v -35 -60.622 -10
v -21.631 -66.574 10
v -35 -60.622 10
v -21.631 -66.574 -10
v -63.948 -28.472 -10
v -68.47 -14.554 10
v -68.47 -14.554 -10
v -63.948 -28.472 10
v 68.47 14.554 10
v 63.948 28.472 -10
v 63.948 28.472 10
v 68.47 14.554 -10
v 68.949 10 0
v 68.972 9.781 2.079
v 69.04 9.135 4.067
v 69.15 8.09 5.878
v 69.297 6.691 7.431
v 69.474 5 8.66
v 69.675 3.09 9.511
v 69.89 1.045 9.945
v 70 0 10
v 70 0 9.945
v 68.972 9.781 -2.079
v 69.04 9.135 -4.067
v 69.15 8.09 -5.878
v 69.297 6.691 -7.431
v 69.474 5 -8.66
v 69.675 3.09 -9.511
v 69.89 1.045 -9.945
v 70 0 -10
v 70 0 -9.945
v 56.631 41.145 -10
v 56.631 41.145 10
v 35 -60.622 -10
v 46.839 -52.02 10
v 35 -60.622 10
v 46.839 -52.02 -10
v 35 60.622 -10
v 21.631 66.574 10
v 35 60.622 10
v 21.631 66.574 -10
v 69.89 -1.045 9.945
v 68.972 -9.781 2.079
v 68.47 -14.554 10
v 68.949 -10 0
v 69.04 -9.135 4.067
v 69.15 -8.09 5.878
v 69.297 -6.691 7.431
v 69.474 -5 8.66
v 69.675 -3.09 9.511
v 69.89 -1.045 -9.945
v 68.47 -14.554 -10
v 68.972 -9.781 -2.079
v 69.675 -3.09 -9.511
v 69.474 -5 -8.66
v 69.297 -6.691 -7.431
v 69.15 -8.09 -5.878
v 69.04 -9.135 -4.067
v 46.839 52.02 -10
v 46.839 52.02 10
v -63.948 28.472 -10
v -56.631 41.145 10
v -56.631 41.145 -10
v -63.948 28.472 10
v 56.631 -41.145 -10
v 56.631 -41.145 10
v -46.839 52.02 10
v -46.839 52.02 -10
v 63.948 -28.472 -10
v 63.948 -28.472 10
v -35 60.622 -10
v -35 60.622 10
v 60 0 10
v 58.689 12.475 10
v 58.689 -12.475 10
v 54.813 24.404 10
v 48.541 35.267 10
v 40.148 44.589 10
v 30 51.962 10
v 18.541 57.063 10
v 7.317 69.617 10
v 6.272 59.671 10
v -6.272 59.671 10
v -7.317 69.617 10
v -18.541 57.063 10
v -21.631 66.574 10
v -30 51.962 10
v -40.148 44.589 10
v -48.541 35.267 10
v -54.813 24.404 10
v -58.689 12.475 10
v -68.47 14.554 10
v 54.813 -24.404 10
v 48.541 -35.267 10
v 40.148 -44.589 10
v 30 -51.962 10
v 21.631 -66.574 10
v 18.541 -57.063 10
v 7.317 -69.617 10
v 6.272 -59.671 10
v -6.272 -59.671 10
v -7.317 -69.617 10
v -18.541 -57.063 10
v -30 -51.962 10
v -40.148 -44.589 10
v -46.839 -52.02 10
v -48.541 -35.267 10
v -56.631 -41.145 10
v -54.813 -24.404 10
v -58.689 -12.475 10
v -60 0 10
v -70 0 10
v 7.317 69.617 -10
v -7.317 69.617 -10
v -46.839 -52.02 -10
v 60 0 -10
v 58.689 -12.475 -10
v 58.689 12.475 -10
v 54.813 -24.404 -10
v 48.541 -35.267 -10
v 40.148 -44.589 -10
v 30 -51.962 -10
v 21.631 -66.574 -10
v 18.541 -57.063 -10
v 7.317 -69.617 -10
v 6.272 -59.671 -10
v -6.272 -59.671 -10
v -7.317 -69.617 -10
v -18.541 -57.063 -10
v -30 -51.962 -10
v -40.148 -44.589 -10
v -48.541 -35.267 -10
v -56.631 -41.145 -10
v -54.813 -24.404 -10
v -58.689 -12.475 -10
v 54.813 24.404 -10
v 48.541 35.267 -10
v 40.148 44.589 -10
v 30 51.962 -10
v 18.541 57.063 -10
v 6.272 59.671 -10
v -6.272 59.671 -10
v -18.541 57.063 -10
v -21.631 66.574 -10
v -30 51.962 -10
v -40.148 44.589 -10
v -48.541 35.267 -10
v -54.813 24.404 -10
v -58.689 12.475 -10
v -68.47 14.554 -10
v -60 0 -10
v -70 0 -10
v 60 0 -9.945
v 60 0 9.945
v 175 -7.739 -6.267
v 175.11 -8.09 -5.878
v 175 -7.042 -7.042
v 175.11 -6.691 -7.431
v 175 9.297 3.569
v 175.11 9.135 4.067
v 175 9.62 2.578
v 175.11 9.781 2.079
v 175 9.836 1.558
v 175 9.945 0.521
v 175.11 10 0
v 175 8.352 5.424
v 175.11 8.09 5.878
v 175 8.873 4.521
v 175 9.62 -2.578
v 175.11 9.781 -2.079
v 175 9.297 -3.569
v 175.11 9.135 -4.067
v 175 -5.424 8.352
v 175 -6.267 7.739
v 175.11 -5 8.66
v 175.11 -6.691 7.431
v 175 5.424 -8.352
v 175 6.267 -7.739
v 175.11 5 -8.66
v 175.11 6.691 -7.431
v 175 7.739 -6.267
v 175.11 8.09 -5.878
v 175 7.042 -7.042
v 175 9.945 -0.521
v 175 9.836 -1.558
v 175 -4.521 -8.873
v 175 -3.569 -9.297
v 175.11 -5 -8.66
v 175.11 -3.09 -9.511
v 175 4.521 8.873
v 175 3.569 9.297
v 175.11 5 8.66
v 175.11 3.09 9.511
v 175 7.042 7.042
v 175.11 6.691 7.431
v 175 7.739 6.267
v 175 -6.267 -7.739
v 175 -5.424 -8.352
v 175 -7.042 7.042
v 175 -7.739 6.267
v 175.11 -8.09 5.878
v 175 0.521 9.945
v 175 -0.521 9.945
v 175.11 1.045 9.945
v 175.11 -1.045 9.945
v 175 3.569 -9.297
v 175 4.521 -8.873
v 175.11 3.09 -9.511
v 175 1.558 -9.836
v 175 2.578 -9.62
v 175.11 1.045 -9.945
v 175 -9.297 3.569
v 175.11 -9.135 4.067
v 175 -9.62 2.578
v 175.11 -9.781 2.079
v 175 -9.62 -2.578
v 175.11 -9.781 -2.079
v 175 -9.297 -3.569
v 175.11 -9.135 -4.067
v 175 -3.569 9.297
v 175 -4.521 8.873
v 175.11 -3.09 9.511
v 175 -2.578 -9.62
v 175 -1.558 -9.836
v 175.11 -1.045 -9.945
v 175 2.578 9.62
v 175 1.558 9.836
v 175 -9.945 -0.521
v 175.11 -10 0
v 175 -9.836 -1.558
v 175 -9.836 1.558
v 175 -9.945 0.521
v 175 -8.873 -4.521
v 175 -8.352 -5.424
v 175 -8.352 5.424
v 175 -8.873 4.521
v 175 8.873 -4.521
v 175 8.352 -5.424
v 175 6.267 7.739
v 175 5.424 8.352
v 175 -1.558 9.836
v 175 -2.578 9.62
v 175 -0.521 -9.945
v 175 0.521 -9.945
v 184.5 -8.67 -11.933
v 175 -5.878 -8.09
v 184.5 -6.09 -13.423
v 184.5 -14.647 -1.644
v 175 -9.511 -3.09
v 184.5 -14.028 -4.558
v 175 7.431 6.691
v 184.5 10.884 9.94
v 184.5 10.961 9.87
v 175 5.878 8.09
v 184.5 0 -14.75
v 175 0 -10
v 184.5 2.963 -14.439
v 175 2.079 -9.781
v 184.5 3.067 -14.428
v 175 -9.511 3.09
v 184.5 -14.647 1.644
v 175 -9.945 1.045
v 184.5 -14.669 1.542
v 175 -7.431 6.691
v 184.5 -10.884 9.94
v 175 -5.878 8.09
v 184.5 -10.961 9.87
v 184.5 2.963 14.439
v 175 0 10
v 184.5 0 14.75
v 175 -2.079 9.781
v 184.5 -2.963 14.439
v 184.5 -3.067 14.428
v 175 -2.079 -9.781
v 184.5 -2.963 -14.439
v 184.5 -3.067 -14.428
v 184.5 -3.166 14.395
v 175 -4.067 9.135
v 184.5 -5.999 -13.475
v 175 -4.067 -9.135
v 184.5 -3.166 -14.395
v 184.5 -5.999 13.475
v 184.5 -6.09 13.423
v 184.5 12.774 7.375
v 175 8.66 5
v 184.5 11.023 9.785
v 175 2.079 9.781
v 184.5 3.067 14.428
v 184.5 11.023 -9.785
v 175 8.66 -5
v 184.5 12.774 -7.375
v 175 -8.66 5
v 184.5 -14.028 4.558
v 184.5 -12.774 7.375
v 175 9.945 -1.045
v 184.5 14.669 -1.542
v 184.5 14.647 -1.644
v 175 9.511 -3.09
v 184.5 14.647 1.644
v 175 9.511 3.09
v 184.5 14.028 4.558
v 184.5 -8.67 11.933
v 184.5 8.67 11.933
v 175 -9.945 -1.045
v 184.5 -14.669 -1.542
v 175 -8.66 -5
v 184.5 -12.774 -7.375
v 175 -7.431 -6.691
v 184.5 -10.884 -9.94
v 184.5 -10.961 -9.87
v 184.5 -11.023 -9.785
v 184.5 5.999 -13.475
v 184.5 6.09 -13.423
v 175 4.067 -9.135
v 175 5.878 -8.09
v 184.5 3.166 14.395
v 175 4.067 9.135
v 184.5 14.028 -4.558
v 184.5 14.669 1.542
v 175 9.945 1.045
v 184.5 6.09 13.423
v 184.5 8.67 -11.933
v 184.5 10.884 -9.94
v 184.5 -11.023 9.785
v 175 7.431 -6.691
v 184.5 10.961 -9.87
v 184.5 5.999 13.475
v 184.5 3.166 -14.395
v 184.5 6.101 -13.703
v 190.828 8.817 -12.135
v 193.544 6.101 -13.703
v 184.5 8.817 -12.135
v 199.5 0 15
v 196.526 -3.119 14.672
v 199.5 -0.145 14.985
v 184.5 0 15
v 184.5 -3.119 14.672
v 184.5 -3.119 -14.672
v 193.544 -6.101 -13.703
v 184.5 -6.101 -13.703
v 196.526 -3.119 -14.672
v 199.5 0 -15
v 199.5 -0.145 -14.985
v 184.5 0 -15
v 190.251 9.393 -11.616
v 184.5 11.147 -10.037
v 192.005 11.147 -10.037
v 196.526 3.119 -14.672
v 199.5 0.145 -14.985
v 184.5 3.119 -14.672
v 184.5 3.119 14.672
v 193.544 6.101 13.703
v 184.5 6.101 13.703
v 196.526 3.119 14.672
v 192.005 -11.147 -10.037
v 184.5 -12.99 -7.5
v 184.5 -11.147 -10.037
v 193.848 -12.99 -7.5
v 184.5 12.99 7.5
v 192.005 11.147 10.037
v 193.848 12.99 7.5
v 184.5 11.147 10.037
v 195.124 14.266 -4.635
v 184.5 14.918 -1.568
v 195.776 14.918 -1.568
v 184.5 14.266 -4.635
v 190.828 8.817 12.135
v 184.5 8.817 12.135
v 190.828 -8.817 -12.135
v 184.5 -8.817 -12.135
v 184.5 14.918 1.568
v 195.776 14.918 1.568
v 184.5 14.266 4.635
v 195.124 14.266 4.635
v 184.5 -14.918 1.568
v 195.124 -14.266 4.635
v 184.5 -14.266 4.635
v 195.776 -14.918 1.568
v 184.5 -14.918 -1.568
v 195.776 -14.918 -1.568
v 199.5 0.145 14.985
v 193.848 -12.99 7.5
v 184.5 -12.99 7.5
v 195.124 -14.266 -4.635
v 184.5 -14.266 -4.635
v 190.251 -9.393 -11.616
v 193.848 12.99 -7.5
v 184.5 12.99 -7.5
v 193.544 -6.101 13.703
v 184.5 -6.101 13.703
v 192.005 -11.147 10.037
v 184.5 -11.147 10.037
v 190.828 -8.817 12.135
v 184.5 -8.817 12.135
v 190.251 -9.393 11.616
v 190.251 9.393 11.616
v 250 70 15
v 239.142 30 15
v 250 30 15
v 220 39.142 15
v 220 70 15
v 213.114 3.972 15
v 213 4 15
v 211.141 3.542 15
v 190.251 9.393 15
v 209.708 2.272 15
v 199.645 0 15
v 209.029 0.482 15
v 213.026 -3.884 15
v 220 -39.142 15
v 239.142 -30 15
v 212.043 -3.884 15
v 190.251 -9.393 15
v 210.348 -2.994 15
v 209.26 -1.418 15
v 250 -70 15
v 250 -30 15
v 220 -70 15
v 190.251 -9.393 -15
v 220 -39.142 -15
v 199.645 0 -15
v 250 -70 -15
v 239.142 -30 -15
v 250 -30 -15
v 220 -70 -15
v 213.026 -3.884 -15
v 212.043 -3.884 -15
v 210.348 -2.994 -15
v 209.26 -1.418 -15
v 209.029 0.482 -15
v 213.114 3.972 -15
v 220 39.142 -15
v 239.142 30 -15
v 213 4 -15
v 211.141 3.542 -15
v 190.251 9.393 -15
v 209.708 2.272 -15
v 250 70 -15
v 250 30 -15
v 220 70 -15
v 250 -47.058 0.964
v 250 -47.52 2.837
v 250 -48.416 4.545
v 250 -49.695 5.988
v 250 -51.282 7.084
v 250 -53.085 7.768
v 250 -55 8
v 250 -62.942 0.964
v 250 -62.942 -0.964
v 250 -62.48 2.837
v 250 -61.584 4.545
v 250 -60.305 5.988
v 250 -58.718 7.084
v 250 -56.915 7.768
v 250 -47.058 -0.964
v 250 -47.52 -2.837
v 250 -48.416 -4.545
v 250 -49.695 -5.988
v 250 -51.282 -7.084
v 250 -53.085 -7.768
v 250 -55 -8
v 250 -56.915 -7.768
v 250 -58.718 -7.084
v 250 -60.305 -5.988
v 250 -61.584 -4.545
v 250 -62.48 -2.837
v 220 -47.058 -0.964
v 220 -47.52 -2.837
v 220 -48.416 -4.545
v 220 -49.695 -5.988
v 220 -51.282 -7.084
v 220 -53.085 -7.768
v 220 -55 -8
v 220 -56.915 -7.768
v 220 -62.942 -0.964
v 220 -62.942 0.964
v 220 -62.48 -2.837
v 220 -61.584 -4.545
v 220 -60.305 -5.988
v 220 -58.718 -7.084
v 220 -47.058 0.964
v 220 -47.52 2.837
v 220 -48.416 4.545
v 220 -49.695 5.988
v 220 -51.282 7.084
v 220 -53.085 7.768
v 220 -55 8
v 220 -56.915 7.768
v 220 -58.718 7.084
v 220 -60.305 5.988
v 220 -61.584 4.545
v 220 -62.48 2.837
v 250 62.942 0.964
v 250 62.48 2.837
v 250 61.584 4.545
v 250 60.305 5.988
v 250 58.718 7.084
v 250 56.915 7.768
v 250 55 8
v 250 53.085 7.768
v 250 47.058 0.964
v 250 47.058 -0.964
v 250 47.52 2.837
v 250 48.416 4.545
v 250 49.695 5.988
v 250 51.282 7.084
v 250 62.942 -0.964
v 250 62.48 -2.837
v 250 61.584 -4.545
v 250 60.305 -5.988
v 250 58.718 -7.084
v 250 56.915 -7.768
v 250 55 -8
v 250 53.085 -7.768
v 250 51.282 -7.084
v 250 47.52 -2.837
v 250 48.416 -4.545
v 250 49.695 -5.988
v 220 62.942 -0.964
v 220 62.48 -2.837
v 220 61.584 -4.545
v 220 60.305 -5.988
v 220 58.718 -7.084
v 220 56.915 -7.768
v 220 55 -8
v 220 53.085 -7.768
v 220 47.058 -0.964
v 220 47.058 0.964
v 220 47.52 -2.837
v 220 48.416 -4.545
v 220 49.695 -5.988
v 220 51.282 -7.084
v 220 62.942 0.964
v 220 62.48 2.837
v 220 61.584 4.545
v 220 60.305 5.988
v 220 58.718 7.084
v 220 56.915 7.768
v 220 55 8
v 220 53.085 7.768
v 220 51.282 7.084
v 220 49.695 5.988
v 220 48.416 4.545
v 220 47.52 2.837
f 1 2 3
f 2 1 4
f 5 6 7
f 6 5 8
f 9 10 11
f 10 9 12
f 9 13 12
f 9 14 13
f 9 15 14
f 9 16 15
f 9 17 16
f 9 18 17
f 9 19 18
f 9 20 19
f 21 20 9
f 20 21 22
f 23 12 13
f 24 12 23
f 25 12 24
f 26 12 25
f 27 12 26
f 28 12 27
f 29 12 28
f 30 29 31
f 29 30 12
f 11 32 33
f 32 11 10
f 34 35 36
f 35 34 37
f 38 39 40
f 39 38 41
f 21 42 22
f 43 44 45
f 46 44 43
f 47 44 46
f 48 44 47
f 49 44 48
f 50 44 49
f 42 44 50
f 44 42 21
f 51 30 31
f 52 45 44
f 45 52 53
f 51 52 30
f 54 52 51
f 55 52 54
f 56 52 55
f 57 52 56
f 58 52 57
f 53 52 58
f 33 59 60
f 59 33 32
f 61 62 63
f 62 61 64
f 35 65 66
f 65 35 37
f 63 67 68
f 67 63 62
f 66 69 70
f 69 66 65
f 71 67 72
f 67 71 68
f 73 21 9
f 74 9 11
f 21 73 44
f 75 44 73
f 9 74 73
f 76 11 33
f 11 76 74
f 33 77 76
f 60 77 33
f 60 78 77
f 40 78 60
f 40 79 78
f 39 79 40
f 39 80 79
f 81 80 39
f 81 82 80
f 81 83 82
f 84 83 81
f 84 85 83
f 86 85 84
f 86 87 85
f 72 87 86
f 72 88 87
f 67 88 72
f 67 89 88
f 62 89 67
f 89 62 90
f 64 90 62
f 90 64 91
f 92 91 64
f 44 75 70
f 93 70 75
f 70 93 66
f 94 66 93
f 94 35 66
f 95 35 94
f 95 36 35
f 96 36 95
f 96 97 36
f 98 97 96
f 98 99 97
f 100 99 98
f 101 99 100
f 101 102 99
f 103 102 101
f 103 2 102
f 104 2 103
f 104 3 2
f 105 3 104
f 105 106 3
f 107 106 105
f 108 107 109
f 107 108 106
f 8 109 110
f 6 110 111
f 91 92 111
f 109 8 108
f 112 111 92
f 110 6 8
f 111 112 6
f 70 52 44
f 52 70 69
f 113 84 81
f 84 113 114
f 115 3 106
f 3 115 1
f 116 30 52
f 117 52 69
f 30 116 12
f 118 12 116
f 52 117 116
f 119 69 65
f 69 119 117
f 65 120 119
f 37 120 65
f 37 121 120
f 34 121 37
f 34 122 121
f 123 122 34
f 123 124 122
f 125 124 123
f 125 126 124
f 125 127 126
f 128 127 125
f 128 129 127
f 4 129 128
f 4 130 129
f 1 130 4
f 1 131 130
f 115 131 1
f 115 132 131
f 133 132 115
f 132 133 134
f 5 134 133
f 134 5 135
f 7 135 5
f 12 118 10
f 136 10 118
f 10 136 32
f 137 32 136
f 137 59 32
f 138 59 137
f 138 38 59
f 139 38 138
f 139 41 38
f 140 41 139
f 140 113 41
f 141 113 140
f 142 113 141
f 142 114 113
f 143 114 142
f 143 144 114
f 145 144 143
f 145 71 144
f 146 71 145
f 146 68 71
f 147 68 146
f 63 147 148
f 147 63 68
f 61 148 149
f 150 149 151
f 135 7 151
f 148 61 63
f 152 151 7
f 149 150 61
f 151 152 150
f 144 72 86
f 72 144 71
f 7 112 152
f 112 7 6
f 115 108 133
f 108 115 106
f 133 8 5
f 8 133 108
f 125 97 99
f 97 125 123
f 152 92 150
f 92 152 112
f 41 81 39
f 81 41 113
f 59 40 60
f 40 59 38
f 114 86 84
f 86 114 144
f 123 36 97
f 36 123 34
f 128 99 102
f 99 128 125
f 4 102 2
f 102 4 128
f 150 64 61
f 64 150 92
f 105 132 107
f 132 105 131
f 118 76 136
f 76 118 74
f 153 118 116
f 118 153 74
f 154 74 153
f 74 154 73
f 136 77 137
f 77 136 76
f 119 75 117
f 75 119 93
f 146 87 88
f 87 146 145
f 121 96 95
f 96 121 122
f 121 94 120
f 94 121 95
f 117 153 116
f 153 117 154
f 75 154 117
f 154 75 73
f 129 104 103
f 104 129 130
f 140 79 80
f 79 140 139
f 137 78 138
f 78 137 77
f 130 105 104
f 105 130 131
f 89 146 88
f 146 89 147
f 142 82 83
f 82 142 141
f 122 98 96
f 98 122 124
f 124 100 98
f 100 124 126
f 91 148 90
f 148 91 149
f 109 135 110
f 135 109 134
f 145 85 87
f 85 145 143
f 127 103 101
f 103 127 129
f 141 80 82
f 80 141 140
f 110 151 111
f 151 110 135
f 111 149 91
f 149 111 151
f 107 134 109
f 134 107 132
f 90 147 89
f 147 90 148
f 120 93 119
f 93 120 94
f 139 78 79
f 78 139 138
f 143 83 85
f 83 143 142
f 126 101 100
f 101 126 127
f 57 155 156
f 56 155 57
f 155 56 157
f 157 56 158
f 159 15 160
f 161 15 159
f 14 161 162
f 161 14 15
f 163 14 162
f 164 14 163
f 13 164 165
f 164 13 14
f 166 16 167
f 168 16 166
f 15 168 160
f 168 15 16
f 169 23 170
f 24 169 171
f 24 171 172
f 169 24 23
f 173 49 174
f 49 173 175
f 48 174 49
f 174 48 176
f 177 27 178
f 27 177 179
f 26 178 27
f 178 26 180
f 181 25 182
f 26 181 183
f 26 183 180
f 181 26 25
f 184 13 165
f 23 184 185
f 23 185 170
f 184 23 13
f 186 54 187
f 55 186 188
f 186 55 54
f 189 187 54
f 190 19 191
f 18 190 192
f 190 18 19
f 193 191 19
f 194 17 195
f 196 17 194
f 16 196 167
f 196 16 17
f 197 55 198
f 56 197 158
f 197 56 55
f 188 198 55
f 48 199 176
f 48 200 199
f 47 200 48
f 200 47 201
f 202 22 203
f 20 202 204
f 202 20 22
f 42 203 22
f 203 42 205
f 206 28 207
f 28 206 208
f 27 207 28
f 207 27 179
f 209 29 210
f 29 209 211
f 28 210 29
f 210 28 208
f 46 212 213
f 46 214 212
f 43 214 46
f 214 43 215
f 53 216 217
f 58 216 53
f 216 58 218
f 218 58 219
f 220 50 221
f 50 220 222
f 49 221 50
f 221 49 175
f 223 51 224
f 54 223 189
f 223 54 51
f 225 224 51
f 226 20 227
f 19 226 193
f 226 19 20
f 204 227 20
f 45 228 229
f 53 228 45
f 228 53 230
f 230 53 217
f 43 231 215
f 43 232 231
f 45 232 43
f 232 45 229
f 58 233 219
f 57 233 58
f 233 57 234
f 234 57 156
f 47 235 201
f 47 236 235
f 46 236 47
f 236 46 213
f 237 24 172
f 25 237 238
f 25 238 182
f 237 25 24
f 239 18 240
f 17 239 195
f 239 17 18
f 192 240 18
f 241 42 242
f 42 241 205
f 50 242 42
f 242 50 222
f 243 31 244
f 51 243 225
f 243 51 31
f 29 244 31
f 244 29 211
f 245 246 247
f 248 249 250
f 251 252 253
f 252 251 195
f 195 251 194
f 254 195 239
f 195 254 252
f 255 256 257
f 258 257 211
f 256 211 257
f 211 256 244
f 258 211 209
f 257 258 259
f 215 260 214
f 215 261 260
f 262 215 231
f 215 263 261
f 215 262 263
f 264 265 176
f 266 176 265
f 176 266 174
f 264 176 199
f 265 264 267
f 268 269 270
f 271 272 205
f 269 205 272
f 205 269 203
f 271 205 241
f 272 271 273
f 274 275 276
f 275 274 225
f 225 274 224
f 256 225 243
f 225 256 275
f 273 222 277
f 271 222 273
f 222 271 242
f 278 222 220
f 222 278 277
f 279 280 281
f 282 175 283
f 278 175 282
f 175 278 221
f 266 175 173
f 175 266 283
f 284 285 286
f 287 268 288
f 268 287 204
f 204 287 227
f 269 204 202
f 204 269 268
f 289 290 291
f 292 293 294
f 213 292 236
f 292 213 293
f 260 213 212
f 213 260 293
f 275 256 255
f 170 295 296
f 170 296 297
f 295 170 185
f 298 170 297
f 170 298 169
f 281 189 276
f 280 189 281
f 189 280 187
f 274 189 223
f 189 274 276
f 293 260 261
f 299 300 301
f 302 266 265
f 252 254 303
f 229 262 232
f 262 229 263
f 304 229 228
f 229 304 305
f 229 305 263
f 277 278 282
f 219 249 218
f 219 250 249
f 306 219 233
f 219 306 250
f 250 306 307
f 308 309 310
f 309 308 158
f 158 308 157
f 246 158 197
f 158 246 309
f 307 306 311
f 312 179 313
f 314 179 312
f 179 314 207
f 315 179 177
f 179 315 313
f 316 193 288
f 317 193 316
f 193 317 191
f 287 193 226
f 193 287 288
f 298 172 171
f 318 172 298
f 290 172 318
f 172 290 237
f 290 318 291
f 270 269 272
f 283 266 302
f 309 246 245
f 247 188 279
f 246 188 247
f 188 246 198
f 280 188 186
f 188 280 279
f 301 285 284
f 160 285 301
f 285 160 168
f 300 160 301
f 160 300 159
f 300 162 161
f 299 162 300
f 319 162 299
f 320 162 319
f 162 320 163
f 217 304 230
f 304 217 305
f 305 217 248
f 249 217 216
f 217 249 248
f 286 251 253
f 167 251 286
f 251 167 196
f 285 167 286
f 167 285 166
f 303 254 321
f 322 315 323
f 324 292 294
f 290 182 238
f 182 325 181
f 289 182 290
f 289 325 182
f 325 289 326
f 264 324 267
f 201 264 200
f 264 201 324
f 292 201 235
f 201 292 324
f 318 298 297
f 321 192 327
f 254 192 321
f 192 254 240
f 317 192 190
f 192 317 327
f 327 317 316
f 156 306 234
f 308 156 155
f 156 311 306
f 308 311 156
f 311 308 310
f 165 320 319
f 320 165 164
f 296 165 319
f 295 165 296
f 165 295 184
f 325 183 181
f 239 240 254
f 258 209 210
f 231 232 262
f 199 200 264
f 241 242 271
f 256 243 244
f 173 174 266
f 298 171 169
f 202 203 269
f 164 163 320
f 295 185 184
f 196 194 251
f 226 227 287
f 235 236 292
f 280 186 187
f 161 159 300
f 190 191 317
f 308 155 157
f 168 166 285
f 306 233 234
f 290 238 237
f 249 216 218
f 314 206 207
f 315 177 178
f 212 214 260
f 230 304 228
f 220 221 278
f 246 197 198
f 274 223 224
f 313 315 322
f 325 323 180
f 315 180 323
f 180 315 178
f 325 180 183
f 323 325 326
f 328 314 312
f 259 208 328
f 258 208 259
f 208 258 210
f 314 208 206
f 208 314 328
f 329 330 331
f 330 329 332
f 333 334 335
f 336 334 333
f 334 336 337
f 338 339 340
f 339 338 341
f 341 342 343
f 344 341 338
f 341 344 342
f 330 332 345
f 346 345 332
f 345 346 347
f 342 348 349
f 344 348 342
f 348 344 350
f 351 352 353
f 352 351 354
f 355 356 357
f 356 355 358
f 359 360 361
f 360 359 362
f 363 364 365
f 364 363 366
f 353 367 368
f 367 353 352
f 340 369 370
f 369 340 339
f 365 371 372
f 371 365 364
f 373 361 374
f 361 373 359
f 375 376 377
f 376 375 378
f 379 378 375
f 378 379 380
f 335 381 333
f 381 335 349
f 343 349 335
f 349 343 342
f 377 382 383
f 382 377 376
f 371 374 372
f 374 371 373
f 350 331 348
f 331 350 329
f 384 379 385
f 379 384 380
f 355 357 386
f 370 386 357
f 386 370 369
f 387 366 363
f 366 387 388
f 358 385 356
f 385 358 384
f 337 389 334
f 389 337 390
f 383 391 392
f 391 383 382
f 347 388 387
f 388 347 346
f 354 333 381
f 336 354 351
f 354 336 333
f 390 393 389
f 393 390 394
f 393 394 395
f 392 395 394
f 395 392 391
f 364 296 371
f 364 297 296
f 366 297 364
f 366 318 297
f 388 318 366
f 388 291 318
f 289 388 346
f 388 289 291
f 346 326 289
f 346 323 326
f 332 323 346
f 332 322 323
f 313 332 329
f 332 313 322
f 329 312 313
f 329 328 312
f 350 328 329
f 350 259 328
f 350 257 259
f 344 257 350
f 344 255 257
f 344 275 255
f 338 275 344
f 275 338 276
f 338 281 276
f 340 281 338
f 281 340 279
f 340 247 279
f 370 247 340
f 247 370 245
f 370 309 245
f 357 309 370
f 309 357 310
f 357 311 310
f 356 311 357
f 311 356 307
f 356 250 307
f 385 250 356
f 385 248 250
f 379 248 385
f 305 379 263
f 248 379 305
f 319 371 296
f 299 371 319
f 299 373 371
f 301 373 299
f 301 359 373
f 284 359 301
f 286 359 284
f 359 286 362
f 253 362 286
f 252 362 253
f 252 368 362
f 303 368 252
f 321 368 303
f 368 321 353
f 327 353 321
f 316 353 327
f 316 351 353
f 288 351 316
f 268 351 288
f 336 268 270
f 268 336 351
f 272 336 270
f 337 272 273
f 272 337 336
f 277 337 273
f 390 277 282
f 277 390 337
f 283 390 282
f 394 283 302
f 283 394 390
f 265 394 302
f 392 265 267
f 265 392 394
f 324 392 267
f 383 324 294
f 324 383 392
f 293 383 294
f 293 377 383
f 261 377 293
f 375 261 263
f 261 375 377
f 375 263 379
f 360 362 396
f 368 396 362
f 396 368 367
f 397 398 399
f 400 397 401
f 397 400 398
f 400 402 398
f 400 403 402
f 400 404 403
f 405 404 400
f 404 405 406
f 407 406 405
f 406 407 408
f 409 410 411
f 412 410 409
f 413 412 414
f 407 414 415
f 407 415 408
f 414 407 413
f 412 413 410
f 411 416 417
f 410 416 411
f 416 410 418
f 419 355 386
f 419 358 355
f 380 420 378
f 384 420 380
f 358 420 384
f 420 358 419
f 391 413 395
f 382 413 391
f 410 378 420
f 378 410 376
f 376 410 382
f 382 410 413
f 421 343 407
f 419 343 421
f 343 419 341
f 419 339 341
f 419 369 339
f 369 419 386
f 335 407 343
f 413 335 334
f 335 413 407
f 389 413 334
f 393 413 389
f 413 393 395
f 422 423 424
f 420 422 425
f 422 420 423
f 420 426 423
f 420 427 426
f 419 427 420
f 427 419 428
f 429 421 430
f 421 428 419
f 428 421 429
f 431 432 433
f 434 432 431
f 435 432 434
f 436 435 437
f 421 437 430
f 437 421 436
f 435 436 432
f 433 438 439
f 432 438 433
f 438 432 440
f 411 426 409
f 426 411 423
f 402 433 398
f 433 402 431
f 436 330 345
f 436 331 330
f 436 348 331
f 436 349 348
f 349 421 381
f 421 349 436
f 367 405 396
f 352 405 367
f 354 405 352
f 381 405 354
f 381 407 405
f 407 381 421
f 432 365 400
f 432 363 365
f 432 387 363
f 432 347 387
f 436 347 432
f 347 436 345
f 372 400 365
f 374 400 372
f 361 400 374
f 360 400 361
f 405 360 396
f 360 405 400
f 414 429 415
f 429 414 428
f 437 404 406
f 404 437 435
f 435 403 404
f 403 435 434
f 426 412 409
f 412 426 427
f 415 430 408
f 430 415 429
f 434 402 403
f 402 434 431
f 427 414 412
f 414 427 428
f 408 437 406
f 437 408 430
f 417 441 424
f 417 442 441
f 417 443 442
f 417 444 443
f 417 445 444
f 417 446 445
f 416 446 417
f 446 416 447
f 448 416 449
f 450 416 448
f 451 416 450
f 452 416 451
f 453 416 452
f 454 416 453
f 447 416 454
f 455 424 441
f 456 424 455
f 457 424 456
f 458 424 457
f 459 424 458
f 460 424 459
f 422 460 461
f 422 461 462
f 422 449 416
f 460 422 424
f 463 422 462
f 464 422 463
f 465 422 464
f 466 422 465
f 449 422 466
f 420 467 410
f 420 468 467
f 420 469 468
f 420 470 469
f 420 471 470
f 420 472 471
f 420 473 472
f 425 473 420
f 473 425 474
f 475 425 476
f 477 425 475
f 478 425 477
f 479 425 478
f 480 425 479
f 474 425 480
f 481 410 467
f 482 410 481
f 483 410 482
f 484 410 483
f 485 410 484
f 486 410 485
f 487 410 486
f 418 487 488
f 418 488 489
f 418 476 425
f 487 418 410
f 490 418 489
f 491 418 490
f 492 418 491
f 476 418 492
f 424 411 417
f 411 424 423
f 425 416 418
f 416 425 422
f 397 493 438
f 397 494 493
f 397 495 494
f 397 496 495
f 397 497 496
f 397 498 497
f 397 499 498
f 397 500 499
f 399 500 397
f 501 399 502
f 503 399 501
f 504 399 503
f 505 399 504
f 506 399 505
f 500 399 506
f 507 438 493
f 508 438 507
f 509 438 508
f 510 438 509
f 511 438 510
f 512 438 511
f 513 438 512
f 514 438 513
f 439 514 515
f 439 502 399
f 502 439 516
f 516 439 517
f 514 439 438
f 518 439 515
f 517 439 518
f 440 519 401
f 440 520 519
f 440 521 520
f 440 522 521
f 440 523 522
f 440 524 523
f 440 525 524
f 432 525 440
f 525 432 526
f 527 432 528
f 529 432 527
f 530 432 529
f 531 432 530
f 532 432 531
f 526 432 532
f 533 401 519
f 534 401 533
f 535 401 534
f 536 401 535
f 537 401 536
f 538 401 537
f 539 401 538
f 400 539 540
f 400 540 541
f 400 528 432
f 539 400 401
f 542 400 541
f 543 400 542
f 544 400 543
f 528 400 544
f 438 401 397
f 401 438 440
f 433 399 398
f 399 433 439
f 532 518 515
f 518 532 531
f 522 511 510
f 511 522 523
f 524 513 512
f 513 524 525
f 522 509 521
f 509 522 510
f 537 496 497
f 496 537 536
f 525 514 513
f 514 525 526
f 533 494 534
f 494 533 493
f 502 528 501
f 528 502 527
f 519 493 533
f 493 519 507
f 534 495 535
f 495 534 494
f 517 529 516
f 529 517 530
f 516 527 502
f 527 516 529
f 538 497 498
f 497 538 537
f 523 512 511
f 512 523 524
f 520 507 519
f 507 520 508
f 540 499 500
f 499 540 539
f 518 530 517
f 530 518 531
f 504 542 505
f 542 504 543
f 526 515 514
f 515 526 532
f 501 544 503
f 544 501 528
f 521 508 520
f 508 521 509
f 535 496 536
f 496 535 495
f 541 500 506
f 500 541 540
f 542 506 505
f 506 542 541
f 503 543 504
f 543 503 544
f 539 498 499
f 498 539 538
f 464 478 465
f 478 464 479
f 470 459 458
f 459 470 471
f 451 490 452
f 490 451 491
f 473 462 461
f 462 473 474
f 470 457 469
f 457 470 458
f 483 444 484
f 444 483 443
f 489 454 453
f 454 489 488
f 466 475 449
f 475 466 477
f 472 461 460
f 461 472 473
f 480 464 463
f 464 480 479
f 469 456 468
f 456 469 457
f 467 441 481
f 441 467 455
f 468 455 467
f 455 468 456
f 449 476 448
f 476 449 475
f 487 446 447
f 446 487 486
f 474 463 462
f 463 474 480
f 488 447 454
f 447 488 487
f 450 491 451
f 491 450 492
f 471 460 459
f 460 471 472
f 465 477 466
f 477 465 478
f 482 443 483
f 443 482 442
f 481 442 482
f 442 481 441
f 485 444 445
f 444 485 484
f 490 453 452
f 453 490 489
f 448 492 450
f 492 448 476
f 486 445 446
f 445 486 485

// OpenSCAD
difference(){
difference(){
union(){
union(){
difference(){
union(){
union(){
union(){
union(){
//union(){
union(){
difference (){
union (){
    //translate ([0,0,0])
     cylinder(h=20, r1=70, r2=70, center = true);
    
}
//translate ([0,0,10])
      cylinder (h=21, r1=60, r2=60, center = true);
    }
    rotate([90,0,90])
    translate([0,0,120])
    cylinder (h=120, r1=10,r2=10, center = true);
}
//translate([120,0,5])
//cube(size = [120, 20, 10], center = true);

//}
translate([180,0,0])
rotate([0,90,0])
cylinder(h=10, r1=10, r=15, center=true);
}
rotate([0,90,0])
translate([0,0,192])
cylinder( h=15, r1=15, r2=15, center=true);
}
//Angled
translate([215,-20,0])
rotate([0,0,45])
cube(size = [20,50, 30], center=true);
}
translate([215,20,0])
rotate([0,0,135])
cube(size = [20,50, 30], center=true);
}

translate([213,0,0])
rotate([0,00,90])
cylinder( h=32, r1=4, r2=4, center=true);
}
//hole sides
translate([235,-50,0])
cube (size=[30,40,30] , center=true);
}
translate([235,50,0])
cube (size=[30,40,30] , center=true);
}
//holes for pins
translate ([235,55 ,0])
rotate([0,90,0])
cylinder(h=45, r1=8, r2=8, center=true);

}

translate ([235,-55 ,0])
rotate([0,90,0])
cylinder(h=45, r1=8, r2=8, center=true);

}
